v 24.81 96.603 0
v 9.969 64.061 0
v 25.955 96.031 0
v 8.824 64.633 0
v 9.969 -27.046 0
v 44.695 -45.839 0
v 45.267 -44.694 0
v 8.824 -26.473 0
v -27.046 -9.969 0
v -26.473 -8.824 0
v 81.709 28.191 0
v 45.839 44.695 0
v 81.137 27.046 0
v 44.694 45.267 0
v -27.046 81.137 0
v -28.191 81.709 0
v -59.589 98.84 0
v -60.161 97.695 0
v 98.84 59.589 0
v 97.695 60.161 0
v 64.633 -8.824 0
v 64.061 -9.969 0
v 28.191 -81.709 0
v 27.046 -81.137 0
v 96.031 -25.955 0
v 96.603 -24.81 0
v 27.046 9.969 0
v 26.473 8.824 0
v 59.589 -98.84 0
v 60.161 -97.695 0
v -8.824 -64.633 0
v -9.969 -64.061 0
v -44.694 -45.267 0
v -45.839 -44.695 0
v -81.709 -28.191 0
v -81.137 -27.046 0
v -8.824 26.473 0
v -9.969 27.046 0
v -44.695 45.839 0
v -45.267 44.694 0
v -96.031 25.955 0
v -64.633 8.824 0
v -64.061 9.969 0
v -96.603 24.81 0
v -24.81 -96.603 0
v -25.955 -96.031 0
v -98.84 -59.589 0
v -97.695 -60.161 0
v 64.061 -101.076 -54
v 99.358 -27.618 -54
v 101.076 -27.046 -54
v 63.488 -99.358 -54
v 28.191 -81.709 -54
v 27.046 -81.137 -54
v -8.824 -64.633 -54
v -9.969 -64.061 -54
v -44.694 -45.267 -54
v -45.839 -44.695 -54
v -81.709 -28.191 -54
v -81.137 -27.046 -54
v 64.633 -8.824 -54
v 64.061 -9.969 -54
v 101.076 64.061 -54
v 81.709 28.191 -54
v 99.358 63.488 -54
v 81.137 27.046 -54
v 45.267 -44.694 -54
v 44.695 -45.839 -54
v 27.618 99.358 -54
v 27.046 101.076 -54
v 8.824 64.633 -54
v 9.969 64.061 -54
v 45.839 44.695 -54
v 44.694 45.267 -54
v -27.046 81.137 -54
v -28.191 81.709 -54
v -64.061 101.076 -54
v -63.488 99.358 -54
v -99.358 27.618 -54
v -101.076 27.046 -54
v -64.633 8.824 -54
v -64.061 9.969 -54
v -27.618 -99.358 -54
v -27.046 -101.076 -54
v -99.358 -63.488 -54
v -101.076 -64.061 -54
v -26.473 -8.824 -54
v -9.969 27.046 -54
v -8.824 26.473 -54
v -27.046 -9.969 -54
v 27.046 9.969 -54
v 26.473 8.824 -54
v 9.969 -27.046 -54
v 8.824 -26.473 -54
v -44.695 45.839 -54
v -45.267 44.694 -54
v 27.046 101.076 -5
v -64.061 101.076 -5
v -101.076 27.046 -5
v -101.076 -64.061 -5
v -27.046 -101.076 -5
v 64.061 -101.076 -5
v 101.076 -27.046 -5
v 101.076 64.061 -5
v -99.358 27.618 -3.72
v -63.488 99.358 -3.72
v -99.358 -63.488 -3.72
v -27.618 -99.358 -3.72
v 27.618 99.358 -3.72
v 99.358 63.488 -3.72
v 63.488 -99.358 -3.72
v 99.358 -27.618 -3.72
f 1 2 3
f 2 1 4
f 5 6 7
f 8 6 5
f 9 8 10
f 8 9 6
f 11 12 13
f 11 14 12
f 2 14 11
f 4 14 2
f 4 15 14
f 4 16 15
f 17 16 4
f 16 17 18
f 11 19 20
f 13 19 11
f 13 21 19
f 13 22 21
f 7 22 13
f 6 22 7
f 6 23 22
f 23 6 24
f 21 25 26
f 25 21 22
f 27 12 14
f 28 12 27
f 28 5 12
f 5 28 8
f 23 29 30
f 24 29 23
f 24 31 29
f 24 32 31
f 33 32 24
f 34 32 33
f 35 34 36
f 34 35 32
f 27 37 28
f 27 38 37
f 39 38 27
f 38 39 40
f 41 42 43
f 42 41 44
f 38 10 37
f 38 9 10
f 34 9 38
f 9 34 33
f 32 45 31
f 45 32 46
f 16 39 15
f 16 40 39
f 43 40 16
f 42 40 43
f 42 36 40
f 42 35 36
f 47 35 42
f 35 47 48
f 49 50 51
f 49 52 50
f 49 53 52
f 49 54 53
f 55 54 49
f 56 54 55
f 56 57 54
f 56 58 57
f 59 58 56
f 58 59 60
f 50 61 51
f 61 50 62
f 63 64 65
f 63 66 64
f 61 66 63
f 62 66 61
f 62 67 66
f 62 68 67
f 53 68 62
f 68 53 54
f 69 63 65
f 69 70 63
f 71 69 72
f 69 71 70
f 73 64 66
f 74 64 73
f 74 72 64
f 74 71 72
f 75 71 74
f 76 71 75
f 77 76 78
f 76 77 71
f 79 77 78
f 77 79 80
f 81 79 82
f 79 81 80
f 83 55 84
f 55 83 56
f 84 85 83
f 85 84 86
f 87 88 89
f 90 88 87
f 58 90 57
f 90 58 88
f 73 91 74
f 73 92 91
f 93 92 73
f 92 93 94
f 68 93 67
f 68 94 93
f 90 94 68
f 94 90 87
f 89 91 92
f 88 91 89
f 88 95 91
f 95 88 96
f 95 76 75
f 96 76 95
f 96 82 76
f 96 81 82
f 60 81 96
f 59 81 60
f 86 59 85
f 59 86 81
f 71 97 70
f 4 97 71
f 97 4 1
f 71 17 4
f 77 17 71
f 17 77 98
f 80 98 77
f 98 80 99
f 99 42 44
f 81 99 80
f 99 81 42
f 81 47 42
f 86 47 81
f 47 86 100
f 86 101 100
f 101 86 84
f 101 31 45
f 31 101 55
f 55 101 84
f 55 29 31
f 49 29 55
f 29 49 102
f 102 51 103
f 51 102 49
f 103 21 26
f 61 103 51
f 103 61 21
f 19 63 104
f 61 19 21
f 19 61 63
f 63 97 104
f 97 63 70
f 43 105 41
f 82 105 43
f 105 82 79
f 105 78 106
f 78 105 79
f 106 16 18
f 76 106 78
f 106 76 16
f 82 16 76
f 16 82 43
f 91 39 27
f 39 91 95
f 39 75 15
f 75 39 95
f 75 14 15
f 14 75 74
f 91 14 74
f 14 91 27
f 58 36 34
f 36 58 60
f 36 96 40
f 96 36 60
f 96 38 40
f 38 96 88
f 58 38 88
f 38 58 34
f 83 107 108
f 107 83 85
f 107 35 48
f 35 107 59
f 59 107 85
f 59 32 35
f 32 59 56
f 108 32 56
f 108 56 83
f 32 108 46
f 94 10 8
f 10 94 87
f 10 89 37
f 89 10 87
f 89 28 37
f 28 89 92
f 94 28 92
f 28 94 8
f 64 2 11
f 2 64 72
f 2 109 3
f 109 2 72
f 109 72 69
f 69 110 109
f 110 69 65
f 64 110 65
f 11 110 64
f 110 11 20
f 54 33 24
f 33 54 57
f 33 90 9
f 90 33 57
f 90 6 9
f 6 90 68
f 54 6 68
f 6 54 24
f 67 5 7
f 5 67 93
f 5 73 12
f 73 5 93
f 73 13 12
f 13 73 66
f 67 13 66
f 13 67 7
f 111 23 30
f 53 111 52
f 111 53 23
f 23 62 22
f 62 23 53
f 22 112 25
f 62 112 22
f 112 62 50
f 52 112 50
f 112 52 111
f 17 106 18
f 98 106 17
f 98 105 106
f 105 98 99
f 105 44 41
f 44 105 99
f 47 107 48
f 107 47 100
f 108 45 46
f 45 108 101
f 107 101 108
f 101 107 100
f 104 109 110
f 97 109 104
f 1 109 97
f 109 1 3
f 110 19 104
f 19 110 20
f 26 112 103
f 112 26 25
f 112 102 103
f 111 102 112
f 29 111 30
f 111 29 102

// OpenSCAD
width = 205;
thickness = 1.28;
height = 54;
chamfer=5;

unit = (width - thickness) / 5;

module rectangle() {
  difference() {
    offset(delta = thickness / 2) square([1, 2] * unit, center = true);
    offset(delta = - thickness / 2) square([1, 2] * unit, center = true);
  }
}
module shadow() {
  for (th = [0, 90, 180, 270]) {
    rotate(th) {
      translate([1, .5] * unit) rectangle();
      translate([2, - .5] * unit) rectangle();
    }
  }
}

module chube(d, t){
    hull(){
       cube([d,    d-2*t,d-2*t], center=true);
       cube([d-2*t,d,    d-2*t], center=true);
       cube([d-2*t,d-2*t,d    ], center=true);
    }
}

module main(){
  render() intersection(){
    linear_extrude(height)shadow();
    translate([0,0,width/2]) chube(width, chamfer);
  }
}
if($preview){
  main();
} else {
  //optimal print orientation
  rotate(atan(2)) mirror([0,0,1]) main();
}
